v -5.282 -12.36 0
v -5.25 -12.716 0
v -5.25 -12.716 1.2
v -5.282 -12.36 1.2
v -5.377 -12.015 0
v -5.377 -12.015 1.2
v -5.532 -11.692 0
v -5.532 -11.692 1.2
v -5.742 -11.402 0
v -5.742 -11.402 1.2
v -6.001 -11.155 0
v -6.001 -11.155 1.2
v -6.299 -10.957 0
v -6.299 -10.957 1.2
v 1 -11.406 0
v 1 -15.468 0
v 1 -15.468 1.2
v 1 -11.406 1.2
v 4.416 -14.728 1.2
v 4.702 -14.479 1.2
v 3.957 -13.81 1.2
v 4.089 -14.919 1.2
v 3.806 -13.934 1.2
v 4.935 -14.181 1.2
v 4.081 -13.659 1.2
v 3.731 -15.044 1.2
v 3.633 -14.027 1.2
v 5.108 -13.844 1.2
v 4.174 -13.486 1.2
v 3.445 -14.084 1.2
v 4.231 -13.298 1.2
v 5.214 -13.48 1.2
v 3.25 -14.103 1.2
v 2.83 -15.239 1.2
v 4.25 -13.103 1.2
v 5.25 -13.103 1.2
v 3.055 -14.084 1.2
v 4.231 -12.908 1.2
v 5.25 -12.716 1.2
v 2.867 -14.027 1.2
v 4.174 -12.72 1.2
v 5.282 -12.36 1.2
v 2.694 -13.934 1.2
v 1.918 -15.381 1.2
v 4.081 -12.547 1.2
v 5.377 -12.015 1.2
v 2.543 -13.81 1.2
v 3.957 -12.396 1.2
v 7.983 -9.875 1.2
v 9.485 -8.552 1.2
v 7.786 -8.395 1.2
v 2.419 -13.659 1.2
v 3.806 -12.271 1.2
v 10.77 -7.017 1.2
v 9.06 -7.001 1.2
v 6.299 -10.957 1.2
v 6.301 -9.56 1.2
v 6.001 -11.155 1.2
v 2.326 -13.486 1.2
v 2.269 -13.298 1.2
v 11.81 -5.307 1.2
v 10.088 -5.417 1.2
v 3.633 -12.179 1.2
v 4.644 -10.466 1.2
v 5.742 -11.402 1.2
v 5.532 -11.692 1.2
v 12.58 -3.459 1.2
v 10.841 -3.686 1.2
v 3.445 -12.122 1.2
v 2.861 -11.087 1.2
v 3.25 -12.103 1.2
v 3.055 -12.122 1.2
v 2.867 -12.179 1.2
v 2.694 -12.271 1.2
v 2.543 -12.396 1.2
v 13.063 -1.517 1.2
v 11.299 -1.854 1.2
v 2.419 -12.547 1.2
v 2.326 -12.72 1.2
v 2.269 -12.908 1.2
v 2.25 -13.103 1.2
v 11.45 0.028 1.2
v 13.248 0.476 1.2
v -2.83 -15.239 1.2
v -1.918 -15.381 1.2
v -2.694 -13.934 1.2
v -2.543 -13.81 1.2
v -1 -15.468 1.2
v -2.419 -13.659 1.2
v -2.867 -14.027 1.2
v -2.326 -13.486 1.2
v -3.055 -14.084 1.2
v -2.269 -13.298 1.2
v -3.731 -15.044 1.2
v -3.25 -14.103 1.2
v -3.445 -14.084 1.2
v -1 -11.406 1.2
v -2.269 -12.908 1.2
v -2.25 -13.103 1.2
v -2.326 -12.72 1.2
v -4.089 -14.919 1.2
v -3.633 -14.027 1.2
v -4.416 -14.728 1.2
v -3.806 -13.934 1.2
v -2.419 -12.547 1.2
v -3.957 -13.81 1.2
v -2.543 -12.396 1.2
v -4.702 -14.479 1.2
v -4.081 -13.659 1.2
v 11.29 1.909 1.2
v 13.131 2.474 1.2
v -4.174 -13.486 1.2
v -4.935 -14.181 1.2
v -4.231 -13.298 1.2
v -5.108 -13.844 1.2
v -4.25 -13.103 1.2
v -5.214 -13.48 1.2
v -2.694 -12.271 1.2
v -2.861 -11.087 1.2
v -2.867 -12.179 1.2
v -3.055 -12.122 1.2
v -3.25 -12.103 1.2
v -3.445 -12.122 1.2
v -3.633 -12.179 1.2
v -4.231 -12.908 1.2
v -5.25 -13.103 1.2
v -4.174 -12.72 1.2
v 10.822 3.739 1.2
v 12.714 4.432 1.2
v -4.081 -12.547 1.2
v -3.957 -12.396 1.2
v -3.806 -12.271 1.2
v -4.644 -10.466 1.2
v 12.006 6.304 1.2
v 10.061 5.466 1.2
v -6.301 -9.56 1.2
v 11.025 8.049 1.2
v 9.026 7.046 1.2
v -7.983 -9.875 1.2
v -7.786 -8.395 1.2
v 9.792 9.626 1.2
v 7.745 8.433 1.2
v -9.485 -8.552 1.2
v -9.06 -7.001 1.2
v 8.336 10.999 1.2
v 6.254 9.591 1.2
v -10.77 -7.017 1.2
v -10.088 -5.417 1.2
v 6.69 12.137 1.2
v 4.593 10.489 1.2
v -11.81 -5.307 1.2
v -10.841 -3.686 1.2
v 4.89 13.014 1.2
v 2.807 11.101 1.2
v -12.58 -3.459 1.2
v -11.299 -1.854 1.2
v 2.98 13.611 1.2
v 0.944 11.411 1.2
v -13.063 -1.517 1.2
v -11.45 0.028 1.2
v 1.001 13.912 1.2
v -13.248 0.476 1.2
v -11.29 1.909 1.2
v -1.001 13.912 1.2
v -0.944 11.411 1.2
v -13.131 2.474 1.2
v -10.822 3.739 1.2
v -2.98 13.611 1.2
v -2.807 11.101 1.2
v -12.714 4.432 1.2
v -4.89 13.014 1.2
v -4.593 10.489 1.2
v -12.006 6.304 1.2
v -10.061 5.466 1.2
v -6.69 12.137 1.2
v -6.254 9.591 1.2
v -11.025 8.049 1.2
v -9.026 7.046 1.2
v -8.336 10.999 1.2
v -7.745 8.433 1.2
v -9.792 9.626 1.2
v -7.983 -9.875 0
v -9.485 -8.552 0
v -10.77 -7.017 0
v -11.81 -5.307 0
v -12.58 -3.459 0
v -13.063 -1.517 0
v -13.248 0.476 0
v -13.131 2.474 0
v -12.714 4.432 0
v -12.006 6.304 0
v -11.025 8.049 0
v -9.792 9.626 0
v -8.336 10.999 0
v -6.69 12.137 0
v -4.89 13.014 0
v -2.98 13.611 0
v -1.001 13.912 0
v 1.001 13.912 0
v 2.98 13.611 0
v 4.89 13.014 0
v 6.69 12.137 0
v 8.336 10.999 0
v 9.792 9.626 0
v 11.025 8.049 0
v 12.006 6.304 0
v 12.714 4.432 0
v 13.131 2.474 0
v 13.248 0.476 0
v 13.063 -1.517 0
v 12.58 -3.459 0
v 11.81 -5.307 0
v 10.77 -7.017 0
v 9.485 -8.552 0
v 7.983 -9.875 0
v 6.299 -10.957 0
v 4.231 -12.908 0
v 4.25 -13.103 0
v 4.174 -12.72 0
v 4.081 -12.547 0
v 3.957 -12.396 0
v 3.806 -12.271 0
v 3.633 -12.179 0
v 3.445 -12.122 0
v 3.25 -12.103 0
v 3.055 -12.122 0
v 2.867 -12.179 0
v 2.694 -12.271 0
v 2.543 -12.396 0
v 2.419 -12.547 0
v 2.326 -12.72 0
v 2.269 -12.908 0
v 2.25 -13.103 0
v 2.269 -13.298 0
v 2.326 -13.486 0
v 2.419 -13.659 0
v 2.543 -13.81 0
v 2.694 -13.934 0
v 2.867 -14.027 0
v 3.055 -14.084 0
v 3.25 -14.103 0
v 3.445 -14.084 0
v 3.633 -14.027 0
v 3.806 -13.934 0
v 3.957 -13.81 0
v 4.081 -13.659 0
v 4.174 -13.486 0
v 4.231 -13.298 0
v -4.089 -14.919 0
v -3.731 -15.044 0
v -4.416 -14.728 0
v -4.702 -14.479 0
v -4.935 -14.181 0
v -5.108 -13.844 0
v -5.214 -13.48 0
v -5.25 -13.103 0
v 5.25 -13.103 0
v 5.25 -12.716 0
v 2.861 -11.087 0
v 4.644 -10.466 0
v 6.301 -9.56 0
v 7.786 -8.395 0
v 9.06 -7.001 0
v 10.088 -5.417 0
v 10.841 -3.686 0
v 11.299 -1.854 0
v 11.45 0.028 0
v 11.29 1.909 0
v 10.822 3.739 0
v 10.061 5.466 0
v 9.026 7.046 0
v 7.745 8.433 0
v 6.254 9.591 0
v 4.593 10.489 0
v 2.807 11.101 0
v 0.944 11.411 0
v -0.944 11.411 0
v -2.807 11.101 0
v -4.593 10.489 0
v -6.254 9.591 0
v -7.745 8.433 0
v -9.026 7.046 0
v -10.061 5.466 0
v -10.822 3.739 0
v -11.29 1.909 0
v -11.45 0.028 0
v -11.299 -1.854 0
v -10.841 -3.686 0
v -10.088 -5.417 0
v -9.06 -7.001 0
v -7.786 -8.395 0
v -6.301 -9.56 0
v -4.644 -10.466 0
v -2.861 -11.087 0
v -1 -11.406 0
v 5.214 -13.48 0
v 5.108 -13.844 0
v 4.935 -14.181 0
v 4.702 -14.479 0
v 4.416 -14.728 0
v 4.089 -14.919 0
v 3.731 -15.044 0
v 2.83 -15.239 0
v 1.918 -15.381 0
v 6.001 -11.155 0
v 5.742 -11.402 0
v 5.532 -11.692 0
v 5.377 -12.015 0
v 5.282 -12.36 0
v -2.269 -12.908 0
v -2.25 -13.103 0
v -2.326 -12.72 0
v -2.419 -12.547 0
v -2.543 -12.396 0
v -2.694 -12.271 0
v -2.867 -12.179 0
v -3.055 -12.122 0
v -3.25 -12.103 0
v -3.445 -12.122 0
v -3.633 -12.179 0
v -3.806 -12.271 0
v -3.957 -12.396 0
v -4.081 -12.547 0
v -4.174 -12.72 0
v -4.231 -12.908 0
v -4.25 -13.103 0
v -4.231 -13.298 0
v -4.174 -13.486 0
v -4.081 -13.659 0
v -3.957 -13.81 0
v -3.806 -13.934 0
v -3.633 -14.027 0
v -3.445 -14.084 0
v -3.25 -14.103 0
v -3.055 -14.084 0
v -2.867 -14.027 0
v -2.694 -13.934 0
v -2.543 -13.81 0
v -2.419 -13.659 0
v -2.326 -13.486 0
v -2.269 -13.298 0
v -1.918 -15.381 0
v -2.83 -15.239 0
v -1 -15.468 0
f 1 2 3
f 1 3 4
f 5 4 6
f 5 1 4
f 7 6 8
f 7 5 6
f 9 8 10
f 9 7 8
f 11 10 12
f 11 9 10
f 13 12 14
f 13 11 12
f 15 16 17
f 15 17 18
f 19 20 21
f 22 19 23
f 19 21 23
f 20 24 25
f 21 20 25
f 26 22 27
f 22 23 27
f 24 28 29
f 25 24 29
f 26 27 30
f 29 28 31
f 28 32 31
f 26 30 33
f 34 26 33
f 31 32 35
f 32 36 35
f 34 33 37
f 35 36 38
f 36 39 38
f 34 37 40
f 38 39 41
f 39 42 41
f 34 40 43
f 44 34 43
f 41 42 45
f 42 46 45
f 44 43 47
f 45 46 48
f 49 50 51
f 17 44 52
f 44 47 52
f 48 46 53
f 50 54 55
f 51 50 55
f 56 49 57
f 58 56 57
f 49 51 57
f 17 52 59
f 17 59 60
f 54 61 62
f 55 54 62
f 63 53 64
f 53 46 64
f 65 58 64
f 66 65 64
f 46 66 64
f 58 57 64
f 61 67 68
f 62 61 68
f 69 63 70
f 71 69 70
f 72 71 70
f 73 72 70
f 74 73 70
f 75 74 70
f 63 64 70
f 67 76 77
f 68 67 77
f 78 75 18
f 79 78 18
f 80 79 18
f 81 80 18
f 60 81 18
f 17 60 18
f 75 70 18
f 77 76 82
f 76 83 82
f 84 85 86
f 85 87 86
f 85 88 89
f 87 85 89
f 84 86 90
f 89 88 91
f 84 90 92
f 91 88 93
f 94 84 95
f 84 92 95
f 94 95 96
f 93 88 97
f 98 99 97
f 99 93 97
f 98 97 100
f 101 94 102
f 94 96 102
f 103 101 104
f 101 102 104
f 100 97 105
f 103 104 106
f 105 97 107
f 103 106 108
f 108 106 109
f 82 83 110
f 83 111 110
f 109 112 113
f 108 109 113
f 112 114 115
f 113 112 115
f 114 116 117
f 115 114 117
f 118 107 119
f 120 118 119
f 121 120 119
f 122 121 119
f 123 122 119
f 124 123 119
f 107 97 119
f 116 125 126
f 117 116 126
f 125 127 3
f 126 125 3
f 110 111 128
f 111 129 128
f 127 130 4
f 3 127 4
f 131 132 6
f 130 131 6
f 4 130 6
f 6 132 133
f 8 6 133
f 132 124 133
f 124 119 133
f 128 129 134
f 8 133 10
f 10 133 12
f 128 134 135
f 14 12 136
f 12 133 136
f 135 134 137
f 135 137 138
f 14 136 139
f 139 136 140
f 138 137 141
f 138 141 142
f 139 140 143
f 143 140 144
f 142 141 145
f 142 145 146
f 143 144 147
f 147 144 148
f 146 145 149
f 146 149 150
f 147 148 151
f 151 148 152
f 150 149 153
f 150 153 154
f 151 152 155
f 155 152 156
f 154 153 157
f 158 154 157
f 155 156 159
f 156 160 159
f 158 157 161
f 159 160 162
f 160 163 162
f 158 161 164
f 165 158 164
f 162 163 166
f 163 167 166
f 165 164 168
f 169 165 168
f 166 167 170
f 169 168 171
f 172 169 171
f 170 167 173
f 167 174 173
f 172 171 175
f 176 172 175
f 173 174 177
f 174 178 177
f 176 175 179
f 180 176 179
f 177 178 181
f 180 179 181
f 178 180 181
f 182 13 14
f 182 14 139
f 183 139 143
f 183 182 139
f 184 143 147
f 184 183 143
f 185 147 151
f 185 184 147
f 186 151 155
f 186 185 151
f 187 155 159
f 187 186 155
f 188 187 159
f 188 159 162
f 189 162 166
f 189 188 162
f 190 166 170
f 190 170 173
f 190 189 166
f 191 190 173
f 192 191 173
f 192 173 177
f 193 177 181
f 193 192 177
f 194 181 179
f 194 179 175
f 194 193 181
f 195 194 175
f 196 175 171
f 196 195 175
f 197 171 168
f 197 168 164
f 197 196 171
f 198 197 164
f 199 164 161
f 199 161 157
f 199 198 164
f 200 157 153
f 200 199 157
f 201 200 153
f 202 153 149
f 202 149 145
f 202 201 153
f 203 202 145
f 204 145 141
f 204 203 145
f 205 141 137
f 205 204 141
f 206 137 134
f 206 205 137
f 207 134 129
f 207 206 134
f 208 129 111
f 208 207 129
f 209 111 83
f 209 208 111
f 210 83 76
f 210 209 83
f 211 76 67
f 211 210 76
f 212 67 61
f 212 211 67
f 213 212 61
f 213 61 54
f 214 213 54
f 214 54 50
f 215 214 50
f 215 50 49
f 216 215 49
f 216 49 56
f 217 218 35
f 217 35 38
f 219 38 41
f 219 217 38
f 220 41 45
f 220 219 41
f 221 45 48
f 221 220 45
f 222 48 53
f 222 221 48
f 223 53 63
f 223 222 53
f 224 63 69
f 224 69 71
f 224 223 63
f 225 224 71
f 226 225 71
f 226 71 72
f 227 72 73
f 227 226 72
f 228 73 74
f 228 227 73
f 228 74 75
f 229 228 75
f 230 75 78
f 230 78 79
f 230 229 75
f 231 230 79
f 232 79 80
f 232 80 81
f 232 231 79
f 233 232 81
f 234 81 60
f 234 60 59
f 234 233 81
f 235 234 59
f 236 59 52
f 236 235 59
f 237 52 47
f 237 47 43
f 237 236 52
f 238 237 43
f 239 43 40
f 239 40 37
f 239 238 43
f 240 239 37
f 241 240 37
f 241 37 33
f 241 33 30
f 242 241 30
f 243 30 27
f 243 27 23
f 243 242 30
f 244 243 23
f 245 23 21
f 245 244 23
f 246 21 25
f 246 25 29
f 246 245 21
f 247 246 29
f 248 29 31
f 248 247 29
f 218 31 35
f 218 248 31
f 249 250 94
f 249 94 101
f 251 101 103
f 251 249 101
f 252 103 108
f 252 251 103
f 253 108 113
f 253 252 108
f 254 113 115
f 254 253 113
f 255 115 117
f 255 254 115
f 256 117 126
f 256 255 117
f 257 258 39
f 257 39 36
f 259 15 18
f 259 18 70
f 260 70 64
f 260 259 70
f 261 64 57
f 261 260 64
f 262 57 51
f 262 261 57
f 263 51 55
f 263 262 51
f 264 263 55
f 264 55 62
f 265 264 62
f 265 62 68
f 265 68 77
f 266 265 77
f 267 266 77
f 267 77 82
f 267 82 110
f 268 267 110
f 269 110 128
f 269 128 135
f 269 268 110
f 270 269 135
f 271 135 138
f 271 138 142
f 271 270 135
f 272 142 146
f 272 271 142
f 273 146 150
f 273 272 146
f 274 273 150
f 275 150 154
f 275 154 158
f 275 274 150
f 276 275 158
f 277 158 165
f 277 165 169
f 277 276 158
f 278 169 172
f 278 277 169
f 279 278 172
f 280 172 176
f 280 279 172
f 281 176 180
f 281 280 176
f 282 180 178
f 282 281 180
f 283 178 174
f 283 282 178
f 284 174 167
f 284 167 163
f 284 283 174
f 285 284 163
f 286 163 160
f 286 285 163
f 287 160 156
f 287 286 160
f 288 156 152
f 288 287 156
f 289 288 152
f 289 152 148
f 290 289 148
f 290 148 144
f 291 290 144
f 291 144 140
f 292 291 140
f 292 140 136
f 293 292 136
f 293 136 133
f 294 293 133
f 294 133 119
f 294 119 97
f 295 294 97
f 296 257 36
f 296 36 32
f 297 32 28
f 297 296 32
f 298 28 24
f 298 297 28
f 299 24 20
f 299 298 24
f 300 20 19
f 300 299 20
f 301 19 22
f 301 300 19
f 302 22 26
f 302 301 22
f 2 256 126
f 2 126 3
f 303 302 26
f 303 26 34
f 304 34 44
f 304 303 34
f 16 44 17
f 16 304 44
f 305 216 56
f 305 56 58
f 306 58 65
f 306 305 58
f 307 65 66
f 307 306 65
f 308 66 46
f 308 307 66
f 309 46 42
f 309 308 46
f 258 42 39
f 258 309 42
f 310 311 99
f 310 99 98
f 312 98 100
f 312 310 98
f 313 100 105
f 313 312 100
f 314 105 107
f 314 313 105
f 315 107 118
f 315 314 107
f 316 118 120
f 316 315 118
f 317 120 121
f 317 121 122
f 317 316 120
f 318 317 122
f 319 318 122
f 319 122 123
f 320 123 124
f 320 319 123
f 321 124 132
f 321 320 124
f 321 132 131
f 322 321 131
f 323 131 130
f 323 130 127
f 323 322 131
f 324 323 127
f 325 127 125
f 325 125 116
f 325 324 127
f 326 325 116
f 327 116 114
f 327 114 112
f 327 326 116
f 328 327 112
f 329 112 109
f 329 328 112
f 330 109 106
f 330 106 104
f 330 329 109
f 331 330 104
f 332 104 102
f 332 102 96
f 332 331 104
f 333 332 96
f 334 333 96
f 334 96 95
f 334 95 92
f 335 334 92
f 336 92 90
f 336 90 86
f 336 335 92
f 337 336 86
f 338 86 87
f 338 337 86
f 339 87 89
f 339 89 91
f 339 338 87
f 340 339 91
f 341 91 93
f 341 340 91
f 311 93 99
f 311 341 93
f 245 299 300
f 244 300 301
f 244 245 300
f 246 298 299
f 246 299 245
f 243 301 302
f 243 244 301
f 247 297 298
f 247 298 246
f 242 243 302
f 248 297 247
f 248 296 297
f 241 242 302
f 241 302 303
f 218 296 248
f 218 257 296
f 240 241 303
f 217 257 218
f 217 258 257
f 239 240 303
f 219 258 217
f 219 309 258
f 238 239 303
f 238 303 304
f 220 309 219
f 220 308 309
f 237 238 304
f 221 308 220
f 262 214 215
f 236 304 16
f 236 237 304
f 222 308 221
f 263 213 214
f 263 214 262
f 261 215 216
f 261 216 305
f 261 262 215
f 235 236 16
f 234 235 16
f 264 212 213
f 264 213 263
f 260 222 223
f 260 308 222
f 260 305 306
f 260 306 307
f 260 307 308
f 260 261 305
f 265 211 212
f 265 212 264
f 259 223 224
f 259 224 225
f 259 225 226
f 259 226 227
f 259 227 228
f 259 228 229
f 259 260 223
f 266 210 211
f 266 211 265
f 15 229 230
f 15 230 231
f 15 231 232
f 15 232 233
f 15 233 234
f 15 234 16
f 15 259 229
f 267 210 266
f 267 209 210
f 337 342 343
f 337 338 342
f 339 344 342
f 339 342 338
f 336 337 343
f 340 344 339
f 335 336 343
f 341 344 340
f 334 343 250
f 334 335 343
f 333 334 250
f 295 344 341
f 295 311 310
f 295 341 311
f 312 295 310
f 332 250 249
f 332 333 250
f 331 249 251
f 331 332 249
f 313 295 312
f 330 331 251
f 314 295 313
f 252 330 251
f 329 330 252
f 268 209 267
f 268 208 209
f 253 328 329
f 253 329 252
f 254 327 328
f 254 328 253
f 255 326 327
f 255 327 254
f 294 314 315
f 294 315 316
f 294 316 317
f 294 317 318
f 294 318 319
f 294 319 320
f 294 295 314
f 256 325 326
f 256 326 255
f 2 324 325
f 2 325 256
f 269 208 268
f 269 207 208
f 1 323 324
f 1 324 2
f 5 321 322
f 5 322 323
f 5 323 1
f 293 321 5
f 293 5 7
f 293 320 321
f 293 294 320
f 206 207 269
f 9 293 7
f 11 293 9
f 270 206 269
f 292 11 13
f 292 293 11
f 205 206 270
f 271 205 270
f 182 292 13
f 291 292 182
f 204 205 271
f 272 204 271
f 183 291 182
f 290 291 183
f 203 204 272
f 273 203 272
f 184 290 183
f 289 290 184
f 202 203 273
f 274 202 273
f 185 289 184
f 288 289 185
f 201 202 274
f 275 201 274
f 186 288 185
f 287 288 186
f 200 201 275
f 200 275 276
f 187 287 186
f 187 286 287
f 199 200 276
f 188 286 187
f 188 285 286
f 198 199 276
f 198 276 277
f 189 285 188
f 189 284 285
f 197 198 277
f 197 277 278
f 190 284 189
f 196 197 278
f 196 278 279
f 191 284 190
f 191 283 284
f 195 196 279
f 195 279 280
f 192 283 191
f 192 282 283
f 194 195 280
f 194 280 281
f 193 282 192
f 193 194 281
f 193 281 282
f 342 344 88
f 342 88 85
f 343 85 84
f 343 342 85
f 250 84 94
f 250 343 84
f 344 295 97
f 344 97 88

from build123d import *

# Parameters (mm, degrees)
ESQUISSE1_R          = 1
BASE_EXTRUSION_DEPTH = 1.2


with BuildPart() as part:
    # Esquisse1 → Base-Extrusion (new body)
    with BuildSketch(Plane.XY):
        with BuildLine():
            Line((-1, -11.406248288), (-1, -15.467708298))
            ThreePointArc((-1, -15.467708298), (-2.37520157, -15.316932379), (-3.731481481, -15.044136597))
            ThreePointArc((-3.731481481, -15.044136597), (-4.825271875, -14.335239515), (-5.25, -13.102957681))
            Line((-5.25, -13.102957681), (-5.25, -12.716407865))
            ThreePointArc((-5.25, -12.716407865), (-5.532204997, -11.692112826), (-6.299180328, -10.956878965))
            ThreePointArc((-6.299180328, -10.956878965), (0, 13.95), (6.299180328, -10.956878965))
            ThreePointArc((6.299180328, -10.956878965), (5.532204997, -11.692112826), (5.25, -12.716407865))
            Line((5.25, -12.716407865), (5.25, -13.102957681))
            ThreePointArc((5.25, -13.102957681), (4.825271875, -14.335239515), (3.731481481, -15.044136597))
            ThreePointArc((3.731481481, -15.044136597), (2.37520157, -15.316932379), (1, -15.467708298))
            Line((1, -15.467708298), (1, -11.406248288))
            ThreePointArc((1, -11.406248288), (0, 11.45), (-1, -11.406248288))
        make_face()
        with Locations((3.25, -13.102957681)):
            Circle(ESQUISSE1_R, mode=Mode.SUBTRACT)
        with Locations((-3.25, -13.102957681)):
            Circle(ESQUISSE1_R, mode=Mode.SUBTRACT)
    extrude(amount=BASE_EXTRUSION_DEPTH)


solid = part.part
